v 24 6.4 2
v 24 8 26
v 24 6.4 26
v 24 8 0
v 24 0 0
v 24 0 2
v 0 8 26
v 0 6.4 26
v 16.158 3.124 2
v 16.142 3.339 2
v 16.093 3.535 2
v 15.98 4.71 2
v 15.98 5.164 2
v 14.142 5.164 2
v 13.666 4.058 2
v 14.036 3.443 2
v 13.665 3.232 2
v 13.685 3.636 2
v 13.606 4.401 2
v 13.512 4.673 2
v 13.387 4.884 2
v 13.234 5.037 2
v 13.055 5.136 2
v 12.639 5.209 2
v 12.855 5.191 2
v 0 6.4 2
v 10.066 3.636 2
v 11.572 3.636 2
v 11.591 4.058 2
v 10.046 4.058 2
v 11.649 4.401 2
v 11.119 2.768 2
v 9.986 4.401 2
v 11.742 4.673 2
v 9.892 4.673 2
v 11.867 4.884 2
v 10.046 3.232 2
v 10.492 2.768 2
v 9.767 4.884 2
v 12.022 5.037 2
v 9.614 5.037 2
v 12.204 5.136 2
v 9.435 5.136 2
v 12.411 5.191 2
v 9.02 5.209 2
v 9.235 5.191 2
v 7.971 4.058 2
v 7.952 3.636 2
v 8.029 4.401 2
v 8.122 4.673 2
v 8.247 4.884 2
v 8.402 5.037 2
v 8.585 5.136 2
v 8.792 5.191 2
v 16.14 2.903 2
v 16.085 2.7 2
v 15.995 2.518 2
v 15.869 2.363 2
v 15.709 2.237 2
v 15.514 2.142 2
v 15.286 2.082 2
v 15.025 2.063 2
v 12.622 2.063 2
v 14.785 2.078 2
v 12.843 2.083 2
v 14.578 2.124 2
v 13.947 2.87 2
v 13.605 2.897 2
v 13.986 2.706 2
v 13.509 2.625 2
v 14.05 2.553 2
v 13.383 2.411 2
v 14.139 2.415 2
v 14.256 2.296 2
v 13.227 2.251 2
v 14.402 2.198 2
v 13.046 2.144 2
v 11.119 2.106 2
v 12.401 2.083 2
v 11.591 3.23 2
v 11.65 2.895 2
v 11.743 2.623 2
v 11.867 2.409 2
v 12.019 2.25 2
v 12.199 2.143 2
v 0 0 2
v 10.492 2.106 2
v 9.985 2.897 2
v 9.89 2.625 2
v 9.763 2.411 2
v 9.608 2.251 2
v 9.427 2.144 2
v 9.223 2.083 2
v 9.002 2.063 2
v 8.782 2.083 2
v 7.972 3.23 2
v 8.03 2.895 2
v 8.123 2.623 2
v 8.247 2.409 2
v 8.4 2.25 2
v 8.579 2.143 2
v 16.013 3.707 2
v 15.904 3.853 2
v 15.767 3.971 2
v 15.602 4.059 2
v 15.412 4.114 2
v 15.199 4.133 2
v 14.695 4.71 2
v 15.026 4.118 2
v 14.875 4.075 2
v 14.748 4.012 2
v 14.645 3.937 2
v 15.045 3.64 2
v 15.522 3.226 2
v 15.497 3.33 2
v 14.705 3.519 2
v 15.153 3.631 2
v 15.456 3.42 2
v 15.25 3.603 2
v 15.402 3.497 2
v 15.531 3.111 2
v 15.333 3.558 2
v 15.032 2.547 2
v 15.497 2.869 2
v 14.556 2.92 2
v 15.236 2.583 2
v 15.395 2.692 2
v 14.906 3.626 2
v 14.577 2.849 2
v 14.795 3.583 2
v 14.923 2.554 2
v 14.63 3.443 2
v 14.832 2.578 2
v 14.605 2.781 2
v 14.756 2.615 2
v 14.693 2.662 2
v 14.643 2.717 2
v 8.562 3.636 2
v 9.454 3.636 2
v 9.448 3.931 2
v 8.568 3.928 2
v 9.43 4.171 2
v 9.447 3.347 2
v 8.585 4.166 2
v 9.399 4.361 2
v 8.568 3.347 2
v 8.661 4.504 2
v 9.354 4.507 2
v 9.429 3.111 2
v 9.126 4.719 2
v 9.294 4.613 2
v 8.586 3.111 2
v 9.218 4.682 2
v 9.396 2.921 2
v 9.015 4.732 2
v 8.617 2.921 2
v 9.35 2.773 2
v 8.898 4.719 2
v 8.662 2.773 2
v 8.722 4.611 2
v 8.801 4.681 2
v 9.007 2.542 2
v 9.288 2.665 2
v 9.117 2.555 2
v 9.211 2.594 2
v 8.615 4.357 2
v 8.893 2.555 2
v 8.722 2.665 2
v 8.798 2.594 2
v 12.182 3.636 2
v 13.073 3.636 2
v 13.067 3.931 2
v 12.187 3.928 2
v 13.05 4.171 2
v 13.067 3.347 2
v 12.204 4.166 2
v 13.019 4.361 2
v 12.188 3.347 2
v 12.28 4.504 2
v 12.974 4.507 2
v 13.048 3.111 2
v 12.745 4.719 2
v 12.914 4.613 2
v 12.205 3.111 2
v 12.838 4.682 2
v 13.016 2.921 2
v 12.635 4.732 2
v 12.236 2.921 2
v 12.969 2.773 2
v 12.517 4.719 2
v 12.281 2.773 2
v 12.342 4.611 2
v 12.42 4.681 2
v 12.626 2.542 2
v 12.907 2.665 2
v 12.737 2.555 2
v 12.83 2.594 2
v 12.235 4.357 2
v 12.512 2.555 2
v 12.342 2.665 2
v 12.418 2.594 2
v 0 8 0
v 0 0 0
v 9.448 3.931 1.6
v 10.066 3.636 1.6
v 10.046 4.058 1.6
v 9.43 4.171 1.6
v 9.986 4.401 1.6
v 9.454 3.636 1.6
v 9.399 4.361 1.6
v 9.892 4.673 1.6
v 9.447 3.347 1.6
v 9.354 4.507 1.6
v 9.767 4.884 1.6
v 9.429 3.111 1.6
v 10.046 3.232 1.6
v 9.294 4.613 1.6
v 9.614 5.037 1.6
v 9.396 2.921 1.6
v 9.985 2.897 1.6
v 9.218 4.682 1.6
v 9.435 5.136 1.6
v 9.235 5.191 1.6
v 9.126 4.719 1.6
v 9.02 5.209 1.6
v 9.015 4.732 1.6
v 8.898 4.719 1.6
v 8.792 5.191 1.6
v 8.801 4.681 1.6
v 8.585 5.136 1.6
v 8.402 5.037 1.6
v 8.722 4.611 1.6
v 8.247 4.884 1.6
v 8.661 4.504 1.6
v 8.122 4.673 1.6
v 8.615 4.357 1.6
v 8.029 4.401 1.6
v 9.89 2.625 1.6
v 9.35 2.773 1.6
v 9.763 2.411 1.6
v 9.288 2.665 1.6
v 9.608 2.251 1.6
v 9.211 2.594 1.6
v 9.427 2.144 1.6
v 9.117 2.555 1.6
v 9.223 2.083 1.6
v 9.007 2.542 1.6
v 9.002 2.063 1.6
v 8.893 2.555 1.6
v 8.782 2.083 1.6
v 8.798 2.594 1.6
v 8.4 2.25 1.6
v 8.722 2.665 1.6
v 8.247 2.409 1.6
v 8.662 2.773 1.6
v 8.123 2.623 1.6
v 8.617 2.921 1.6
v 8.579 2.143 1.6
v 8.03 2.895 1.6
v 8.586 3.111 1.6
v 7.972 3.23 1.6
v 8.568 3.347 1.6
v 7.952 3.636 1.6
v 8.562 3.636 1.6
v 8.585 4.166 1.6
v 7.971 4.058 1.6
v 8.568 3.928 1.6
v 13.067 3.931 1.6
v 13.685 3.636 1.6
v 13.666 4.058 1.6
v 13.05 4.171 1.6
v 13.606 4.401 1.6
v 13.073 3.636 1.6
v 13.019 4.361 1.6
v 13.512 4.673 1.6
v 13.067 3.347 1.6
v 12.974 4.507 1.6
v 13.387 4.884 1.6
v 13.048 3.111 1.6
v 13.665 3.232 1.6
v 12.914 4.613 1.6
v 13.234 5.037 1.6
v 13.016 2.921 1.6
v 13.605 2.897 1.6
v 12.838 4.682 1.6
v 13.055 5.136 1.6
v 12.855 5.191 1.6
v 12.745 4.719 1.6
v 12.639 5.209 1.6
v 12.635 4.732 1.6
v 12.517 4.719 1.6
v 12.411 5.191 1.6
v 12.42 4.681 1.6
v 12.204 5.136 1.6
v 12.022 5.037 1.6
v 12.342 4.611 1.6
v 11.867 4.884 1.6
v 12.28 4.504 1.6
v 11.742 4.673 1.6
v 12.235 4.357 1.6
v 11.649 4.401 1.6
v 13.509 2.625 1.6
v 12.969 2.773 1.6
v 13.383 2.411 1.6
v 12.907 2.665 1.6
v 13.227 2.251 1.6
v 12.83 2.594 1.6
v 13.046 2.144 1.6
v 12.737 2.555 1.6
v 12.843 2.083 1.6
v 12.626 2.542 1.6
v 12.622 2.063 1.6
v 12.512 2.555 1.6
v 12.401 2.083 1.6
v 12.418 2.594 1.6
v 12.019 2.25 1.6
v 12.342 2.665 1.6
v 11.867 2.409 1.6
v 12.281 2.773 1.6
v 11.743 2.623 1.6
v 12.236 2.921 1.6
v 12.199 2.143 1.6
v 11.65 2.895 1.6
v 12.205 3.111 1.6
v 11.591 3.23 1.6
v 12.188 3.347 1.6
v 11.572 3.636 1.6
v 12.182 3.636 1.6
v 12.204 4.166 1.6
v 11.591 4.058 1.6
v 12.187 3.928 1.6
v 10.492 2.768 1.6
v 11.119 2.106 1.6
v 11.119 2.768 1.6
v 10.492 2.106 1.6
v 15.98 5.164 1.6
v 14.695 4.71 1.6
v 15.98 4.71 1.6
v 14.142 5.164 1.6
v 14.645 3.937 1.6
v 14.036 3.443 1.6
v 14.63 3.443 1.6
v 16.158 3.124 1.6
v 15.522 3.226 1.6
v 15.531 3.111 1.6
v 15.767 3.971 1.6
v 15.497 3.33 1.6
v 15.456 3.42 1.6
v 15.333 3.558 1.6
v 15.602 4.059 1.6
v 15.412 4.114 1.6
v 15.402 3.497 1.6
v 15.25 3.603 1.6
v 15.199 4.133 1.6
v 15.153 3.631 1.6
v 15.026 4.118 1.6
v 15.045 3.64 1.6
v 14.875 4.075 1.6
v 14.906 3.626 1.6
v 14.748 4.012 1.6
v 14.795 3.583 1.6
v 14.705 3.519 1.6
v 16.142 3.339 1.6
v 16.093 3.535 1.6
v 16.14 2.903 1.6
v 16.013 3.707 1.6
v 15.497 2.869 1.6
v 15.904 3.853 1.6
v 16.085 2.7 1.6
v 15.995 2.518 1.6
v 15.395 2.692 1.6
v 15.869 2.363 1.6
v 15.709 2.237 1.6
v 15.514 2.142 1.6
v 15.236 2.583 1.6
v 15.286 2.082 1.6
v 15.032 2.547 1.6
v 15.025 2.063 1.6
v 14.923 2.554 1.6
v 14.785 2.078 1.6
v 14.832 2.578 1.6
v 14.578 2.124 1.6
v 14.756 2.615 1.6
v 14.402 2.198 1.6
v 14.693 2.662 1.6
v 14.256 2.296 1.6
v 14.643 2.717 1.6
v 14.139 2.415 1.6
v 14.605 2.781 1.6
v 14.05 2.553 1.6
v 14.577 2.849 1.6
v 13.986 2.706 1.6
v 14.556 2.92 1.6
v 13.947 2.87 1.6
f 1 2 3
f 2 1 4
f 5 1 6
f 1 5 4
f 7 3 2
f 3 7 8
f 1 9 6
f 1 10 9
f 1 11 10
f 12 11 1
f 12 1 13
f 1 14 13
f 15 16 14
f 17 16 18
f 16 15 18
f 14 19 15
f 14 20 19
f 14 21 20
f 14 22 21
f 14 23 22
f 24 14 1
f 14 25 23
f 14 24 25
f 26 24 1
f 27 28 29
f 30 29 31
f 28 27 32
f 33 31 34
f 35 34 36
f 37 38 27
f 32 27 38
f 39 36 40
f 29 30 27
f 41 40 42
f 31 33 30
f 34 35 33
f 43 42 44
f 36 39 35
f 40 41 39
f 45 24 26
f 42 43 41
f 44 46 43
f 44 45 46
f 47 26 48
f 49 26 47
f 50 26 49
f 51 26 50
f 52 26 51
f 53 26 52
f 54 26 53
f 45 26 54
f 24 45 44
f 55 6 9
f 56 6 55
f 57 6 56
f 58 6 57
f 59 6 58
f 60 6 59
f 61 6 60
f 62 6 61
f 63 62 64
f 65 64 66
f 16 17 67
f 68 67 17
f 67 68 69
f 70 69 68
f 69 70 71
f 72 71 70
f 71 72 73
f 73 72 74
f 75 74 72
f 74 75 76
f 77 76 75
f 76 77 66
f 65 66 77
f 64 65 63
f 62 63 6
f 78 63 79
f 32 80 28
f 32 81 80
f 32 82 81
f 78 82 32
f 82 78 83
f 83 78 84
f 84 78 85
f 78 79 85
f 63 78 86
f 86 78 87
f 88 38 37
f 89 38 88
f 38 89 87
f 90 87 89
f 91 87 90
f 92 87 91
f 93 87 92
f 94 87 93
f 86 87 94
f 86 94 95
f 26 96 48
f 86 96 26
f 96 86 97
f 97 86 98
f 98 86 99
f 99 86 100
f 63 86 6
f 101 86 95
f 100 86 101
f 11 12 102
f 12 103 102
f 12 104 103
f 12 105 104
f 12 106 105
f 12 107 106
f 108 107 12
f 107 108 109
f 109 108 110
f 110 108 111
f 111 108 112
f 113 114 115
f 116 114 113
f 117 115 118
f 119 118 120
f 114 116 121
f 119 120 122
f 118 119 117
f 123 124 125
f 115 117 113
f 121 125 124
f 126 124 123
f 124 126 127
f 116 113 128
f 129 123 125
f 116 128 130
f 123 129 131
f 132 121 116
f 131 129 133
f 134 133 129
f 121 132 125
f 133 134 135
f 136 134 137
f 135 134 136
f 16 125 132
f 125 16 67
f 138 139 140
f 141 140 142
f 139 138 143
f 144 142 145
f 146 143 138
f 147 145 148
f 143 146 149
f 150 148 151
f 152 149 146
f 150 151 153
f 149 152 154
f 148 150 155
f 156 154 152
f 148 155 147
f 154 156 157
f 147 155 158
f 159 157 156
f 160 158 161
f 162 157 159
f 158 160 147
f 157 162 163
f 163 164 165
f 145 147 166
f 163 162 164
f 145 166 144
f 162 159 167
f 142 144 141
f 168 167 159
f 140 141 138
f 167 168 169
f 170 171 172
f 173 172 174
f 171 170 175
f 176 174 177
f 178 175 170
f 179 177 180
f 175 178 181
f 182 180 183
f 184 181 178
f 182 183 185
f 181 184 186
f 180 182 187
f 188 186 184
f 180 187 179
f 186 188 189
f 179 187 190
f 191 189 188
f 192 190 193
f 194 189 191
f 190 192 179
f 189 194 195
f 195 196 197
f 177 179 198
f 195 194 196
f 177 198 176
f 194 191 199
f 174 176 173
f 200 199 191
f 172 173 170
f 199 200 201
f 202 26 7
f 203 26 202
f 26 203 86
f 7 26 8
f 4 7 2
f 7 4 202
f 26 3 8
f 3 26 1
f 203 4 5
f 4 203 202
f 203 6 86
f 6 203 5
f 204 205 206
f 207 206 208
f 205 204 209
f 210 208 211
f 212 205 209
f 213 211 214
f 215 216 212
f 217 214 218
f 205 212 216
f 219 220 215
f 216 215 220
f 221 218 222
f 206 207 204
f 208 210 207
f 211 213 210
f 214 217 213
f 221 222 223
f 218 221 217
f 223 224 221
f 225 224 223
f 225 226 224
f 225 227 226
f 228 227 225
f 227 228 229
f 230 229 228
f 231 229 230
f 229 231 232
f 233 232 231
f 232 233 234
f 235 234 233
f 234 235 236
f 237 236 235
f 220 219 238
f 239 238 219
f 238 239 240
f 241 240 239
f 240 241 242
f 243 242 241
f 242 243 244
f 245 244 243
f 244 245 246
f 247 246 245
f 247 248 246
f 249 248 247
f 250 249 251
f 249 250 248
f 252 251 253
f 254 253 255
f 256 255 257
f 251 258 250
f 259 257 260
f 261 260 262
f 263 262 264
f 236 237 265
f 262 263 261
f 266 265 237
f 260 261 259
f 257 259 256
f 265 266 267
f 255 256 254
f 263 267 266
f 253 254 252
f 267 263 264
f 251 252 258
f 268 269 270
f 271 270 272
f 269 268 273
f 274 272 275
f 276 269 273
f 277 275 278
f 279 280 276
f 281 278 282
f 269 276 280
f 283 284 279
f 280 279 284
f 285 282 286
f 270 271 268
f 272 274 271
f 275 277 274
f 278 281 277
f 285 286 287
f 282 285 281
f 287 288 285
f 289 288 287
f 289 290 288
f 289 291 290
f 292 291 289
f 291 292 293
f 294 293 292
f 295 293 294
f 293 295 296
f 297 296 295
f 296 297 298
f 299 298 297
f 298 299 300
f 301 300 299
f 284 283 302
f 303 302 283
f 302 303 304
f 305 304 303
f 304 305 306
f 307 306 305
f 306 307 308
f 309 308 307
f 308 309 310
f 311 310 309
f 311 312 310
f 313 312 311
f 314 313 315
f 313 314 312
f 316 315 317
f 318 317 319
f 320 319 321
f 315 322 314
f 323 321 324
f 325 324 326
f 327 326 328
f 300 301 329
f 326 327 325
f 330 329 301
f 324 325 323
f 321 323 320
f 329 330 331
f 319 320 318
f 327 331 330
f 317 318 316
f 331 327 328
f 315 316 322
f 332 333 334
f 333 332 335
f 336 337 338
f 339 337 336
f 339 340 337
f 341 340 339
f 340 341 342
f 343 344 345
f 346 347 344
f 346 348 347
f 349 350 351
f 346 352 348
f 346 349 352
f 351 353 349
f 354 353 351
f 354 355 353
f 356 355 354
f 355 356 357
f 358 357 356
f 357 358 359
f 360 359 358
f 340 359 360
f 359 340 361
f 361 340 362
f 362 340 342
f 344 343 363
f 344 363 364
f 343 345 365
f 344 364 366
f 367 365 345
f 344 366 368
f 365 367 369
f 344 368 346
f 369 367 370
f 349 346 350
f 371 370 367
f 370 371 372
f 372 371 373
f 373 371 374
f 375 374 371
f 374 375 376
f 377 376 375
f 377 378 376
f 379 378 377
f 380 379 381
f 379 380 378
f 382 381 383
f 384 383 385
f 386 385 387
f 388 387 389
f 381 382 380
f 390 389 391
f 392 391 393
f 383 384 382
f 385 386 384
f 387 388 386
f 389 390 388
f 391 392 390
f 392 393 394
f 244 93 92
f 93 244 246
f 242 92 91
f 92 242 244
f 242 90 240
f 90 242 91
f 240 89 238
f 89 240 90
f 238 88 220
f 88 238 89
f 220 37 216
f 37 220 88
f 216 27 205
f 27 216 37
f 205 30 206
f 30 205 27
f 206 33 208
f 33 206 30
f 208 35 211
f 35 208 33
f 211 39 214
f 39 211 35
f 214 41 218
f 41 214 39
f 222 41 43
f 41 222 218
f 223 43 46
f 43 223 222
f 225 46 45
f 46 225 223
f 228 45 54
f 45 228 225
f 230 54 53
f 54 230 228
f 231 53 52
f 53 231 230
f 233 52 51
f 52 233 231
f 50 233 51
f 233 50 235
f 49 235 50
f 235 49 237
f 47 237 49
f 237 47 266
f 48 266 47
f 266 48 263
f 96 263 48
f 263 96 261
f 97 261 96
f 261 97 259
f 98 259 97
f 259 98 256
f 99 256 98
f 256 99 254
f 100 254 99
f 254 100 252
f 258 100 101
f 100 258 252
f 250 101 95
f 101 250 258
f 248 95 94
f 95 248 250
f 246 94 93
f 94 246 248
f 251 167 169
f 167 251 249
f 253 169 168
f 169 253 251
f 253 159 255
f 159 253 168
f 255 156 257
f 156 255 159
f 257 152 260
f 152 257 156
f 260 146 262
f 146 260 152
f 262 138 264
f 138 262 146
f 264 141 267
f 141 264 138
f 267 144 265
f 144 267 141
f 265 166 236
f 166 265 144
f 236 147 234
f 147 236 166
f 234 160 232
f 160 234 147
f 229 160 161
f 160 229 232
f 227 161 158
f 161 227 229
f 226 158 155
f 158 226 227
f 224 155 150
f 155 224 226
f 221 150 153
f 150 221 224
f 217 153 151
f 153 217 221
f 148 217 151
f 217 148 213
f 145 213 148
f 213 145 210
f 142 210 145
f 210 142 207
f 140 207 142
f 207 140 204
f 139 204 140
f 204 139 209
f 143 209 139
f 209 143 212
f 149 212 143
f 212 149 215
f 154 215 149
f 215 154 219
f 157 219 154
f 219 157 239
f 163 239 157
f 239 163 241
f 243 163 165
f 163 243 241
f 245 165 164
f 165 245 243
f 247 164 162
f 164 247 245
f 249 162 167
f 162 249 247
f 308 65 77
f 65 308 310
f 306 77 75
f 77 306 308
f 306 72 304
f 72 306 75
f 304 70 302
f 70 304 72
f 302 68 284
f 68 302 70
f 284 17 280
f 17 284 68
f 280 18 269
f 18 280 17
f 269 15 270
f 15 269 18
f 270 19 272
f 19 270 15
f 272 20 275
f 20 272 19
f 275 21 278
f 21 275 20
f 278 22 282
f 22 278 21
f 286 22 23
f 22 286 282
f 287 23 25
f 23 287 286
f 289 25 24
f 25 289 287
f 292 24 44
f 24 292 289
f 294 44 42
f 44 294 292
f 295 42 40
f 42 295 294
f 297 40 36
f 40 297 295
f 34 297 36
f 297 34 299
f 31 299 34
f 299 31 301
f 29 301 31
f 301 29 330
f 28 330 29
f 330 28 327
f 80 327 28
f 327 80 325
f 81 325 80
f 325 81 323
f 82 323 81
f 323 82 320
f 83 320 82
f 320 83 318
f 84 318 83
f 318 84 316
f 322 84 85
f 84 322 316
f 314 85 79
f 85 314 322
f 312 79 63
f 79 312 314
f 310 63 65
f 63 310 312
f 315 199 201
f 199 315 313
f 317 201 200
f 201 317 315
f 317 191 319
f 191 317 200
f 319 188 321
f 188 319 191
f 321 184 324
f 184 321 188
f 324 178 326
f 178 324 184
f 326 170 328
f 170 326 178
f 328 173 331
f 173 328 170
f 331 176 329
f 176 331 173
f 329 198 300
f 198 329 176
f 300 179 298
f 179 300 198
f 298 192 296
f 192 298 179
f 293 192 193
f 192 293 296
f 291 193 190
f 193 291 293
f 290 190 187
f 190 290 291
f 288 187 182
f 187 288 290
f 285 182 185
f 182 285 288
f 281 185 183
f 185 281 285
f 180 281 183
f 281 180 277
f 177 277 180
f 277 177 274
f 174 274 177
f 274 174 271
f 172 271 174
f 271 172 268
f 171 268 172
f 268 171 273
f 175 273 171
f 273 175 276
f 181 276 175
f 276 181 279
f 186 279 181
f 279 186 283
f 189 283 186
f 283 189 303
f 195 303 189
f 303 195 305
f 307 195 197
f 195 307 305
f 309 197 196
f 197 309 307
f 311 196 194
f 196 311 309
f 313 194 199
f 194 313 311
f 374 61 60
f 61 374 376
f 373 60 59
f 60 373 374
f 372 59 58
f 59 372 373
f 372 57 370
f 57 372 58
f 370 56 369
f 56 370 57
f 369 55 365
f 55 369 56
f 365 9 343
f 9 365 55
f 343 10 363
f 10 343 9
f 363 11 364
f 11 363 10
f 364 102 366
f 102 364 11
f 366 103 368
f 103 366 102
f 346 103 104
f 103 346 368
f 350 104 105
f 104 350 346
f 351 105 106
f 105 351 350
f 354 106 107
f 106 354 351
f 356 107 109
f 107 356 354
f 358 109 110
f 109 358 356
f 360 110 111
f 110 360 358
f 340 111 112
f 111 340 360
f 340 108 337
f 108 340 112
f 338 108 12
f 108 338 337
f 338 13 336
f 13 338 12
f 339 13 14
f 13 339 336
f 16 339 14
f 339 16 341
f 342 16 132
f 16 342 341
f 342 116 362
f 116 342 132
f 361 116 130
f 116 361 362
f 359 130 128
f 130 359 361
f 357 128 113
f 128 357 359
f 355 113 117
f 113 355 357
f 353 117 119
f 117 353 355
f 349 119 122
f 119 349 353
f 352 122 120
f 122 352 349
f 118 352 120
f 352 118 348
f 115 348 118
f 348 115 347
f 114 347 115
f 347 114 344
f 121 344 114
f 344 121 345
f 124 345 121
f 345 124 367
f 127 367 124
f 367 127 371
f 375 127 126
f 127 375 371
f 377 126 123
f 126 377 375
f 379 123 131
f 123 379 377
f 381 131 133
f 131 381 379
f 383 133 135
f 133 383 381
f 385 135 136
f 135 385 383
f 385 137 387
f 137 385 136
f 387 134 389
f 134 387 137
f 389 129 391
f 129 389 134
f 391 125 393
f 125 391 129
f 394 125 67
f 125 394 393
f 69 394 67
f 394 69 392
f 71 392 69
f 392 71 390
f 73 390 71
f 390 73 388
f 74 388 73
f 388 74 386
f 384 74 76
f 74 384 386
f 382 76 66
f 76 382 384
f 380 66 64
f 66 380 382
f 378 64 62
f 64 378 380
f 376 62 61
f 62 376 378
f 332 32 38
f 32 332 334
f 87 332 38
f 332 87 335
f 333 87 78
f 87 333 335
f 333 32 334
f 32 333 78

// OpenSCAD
// file: primitives.scad
// Shared printable geometry for Vault Lite models.

module rounded_box(size = [20, 20, 5], radius = 2, center = false) {
    assert(radius >= 0, "radius must be non-negative");
    assert(2 * radius <= min(size.x, size.y), "radius is too large for box");
    translate(center ? [0, 0, -size.z / 2] : [size.x / 2, size.y / 2, 0])
        linear_extrude(height = size.z)
            offset(r = radius)
                square([size.x - 2 * radius, size.y - 2 * radius], center = true);
}

module engraved_label(label, size = 4, depth = 0.5, halign = "center") {
    linear_extrude(height = depth)
        text(label, size = size, halign = halign, valign = "center",
             font = "Liberation Sans:style=Bold");
}

module horizontal_trough(diameter, length) {
    rotate([90, 0, 0]) cylinder(d = diameter, h = length, center = true, $fn = 72);
}
// main file
use <primitives.scad>

/*
  Minimal upright wall card for Bambu Studio fuzzy-skin comparisons.

  Render three copies with FUZZY_INDEX = 0, 1, and 2. Fuzzy skin is a slicer
  setting and is not encoded in the STL; the index changes only the recessed
  identifier on the stabilizing foot.
*/

FUZZY_INDEX = is_undef(FUZZY_INDEX) ? 0 : FUZZY_INDEX;
labels = ["0.05", "0.08", "0.12"];

assert(FUZZY_INDEX >= 0 && FUZZY_INDEX < len(labels),
       "FUZZY_INDEX must be 0, 1, or 2");

card_w = 24;
card_h = 24;
card_t = 1.6;
foot_d = 8;
foot_h = 2.0;
label_depth = 0.4;

difference() {
    union() {
        // Thin upright test face. Its broad X/Z faces show the applied texture.
        translate([0, foot_d - card_t, foot_h])
            cube([card_w, card_t, card_h]);

        // Low-volume foot keeps the wall stable without a brim in most cases.
        cube([card_w, foot_d, foot_h]);
    }

    // Identifier is recessed into the horizontal foot and does not alter the
    // broad vertical comparison face.
    translate([card_w / 2, foot_d / 2 - 0.4, foot_h - label_depth])
        engraved_label(labels[FUZZY_INDEX], 3.2, label_depth + 0.05);
}
